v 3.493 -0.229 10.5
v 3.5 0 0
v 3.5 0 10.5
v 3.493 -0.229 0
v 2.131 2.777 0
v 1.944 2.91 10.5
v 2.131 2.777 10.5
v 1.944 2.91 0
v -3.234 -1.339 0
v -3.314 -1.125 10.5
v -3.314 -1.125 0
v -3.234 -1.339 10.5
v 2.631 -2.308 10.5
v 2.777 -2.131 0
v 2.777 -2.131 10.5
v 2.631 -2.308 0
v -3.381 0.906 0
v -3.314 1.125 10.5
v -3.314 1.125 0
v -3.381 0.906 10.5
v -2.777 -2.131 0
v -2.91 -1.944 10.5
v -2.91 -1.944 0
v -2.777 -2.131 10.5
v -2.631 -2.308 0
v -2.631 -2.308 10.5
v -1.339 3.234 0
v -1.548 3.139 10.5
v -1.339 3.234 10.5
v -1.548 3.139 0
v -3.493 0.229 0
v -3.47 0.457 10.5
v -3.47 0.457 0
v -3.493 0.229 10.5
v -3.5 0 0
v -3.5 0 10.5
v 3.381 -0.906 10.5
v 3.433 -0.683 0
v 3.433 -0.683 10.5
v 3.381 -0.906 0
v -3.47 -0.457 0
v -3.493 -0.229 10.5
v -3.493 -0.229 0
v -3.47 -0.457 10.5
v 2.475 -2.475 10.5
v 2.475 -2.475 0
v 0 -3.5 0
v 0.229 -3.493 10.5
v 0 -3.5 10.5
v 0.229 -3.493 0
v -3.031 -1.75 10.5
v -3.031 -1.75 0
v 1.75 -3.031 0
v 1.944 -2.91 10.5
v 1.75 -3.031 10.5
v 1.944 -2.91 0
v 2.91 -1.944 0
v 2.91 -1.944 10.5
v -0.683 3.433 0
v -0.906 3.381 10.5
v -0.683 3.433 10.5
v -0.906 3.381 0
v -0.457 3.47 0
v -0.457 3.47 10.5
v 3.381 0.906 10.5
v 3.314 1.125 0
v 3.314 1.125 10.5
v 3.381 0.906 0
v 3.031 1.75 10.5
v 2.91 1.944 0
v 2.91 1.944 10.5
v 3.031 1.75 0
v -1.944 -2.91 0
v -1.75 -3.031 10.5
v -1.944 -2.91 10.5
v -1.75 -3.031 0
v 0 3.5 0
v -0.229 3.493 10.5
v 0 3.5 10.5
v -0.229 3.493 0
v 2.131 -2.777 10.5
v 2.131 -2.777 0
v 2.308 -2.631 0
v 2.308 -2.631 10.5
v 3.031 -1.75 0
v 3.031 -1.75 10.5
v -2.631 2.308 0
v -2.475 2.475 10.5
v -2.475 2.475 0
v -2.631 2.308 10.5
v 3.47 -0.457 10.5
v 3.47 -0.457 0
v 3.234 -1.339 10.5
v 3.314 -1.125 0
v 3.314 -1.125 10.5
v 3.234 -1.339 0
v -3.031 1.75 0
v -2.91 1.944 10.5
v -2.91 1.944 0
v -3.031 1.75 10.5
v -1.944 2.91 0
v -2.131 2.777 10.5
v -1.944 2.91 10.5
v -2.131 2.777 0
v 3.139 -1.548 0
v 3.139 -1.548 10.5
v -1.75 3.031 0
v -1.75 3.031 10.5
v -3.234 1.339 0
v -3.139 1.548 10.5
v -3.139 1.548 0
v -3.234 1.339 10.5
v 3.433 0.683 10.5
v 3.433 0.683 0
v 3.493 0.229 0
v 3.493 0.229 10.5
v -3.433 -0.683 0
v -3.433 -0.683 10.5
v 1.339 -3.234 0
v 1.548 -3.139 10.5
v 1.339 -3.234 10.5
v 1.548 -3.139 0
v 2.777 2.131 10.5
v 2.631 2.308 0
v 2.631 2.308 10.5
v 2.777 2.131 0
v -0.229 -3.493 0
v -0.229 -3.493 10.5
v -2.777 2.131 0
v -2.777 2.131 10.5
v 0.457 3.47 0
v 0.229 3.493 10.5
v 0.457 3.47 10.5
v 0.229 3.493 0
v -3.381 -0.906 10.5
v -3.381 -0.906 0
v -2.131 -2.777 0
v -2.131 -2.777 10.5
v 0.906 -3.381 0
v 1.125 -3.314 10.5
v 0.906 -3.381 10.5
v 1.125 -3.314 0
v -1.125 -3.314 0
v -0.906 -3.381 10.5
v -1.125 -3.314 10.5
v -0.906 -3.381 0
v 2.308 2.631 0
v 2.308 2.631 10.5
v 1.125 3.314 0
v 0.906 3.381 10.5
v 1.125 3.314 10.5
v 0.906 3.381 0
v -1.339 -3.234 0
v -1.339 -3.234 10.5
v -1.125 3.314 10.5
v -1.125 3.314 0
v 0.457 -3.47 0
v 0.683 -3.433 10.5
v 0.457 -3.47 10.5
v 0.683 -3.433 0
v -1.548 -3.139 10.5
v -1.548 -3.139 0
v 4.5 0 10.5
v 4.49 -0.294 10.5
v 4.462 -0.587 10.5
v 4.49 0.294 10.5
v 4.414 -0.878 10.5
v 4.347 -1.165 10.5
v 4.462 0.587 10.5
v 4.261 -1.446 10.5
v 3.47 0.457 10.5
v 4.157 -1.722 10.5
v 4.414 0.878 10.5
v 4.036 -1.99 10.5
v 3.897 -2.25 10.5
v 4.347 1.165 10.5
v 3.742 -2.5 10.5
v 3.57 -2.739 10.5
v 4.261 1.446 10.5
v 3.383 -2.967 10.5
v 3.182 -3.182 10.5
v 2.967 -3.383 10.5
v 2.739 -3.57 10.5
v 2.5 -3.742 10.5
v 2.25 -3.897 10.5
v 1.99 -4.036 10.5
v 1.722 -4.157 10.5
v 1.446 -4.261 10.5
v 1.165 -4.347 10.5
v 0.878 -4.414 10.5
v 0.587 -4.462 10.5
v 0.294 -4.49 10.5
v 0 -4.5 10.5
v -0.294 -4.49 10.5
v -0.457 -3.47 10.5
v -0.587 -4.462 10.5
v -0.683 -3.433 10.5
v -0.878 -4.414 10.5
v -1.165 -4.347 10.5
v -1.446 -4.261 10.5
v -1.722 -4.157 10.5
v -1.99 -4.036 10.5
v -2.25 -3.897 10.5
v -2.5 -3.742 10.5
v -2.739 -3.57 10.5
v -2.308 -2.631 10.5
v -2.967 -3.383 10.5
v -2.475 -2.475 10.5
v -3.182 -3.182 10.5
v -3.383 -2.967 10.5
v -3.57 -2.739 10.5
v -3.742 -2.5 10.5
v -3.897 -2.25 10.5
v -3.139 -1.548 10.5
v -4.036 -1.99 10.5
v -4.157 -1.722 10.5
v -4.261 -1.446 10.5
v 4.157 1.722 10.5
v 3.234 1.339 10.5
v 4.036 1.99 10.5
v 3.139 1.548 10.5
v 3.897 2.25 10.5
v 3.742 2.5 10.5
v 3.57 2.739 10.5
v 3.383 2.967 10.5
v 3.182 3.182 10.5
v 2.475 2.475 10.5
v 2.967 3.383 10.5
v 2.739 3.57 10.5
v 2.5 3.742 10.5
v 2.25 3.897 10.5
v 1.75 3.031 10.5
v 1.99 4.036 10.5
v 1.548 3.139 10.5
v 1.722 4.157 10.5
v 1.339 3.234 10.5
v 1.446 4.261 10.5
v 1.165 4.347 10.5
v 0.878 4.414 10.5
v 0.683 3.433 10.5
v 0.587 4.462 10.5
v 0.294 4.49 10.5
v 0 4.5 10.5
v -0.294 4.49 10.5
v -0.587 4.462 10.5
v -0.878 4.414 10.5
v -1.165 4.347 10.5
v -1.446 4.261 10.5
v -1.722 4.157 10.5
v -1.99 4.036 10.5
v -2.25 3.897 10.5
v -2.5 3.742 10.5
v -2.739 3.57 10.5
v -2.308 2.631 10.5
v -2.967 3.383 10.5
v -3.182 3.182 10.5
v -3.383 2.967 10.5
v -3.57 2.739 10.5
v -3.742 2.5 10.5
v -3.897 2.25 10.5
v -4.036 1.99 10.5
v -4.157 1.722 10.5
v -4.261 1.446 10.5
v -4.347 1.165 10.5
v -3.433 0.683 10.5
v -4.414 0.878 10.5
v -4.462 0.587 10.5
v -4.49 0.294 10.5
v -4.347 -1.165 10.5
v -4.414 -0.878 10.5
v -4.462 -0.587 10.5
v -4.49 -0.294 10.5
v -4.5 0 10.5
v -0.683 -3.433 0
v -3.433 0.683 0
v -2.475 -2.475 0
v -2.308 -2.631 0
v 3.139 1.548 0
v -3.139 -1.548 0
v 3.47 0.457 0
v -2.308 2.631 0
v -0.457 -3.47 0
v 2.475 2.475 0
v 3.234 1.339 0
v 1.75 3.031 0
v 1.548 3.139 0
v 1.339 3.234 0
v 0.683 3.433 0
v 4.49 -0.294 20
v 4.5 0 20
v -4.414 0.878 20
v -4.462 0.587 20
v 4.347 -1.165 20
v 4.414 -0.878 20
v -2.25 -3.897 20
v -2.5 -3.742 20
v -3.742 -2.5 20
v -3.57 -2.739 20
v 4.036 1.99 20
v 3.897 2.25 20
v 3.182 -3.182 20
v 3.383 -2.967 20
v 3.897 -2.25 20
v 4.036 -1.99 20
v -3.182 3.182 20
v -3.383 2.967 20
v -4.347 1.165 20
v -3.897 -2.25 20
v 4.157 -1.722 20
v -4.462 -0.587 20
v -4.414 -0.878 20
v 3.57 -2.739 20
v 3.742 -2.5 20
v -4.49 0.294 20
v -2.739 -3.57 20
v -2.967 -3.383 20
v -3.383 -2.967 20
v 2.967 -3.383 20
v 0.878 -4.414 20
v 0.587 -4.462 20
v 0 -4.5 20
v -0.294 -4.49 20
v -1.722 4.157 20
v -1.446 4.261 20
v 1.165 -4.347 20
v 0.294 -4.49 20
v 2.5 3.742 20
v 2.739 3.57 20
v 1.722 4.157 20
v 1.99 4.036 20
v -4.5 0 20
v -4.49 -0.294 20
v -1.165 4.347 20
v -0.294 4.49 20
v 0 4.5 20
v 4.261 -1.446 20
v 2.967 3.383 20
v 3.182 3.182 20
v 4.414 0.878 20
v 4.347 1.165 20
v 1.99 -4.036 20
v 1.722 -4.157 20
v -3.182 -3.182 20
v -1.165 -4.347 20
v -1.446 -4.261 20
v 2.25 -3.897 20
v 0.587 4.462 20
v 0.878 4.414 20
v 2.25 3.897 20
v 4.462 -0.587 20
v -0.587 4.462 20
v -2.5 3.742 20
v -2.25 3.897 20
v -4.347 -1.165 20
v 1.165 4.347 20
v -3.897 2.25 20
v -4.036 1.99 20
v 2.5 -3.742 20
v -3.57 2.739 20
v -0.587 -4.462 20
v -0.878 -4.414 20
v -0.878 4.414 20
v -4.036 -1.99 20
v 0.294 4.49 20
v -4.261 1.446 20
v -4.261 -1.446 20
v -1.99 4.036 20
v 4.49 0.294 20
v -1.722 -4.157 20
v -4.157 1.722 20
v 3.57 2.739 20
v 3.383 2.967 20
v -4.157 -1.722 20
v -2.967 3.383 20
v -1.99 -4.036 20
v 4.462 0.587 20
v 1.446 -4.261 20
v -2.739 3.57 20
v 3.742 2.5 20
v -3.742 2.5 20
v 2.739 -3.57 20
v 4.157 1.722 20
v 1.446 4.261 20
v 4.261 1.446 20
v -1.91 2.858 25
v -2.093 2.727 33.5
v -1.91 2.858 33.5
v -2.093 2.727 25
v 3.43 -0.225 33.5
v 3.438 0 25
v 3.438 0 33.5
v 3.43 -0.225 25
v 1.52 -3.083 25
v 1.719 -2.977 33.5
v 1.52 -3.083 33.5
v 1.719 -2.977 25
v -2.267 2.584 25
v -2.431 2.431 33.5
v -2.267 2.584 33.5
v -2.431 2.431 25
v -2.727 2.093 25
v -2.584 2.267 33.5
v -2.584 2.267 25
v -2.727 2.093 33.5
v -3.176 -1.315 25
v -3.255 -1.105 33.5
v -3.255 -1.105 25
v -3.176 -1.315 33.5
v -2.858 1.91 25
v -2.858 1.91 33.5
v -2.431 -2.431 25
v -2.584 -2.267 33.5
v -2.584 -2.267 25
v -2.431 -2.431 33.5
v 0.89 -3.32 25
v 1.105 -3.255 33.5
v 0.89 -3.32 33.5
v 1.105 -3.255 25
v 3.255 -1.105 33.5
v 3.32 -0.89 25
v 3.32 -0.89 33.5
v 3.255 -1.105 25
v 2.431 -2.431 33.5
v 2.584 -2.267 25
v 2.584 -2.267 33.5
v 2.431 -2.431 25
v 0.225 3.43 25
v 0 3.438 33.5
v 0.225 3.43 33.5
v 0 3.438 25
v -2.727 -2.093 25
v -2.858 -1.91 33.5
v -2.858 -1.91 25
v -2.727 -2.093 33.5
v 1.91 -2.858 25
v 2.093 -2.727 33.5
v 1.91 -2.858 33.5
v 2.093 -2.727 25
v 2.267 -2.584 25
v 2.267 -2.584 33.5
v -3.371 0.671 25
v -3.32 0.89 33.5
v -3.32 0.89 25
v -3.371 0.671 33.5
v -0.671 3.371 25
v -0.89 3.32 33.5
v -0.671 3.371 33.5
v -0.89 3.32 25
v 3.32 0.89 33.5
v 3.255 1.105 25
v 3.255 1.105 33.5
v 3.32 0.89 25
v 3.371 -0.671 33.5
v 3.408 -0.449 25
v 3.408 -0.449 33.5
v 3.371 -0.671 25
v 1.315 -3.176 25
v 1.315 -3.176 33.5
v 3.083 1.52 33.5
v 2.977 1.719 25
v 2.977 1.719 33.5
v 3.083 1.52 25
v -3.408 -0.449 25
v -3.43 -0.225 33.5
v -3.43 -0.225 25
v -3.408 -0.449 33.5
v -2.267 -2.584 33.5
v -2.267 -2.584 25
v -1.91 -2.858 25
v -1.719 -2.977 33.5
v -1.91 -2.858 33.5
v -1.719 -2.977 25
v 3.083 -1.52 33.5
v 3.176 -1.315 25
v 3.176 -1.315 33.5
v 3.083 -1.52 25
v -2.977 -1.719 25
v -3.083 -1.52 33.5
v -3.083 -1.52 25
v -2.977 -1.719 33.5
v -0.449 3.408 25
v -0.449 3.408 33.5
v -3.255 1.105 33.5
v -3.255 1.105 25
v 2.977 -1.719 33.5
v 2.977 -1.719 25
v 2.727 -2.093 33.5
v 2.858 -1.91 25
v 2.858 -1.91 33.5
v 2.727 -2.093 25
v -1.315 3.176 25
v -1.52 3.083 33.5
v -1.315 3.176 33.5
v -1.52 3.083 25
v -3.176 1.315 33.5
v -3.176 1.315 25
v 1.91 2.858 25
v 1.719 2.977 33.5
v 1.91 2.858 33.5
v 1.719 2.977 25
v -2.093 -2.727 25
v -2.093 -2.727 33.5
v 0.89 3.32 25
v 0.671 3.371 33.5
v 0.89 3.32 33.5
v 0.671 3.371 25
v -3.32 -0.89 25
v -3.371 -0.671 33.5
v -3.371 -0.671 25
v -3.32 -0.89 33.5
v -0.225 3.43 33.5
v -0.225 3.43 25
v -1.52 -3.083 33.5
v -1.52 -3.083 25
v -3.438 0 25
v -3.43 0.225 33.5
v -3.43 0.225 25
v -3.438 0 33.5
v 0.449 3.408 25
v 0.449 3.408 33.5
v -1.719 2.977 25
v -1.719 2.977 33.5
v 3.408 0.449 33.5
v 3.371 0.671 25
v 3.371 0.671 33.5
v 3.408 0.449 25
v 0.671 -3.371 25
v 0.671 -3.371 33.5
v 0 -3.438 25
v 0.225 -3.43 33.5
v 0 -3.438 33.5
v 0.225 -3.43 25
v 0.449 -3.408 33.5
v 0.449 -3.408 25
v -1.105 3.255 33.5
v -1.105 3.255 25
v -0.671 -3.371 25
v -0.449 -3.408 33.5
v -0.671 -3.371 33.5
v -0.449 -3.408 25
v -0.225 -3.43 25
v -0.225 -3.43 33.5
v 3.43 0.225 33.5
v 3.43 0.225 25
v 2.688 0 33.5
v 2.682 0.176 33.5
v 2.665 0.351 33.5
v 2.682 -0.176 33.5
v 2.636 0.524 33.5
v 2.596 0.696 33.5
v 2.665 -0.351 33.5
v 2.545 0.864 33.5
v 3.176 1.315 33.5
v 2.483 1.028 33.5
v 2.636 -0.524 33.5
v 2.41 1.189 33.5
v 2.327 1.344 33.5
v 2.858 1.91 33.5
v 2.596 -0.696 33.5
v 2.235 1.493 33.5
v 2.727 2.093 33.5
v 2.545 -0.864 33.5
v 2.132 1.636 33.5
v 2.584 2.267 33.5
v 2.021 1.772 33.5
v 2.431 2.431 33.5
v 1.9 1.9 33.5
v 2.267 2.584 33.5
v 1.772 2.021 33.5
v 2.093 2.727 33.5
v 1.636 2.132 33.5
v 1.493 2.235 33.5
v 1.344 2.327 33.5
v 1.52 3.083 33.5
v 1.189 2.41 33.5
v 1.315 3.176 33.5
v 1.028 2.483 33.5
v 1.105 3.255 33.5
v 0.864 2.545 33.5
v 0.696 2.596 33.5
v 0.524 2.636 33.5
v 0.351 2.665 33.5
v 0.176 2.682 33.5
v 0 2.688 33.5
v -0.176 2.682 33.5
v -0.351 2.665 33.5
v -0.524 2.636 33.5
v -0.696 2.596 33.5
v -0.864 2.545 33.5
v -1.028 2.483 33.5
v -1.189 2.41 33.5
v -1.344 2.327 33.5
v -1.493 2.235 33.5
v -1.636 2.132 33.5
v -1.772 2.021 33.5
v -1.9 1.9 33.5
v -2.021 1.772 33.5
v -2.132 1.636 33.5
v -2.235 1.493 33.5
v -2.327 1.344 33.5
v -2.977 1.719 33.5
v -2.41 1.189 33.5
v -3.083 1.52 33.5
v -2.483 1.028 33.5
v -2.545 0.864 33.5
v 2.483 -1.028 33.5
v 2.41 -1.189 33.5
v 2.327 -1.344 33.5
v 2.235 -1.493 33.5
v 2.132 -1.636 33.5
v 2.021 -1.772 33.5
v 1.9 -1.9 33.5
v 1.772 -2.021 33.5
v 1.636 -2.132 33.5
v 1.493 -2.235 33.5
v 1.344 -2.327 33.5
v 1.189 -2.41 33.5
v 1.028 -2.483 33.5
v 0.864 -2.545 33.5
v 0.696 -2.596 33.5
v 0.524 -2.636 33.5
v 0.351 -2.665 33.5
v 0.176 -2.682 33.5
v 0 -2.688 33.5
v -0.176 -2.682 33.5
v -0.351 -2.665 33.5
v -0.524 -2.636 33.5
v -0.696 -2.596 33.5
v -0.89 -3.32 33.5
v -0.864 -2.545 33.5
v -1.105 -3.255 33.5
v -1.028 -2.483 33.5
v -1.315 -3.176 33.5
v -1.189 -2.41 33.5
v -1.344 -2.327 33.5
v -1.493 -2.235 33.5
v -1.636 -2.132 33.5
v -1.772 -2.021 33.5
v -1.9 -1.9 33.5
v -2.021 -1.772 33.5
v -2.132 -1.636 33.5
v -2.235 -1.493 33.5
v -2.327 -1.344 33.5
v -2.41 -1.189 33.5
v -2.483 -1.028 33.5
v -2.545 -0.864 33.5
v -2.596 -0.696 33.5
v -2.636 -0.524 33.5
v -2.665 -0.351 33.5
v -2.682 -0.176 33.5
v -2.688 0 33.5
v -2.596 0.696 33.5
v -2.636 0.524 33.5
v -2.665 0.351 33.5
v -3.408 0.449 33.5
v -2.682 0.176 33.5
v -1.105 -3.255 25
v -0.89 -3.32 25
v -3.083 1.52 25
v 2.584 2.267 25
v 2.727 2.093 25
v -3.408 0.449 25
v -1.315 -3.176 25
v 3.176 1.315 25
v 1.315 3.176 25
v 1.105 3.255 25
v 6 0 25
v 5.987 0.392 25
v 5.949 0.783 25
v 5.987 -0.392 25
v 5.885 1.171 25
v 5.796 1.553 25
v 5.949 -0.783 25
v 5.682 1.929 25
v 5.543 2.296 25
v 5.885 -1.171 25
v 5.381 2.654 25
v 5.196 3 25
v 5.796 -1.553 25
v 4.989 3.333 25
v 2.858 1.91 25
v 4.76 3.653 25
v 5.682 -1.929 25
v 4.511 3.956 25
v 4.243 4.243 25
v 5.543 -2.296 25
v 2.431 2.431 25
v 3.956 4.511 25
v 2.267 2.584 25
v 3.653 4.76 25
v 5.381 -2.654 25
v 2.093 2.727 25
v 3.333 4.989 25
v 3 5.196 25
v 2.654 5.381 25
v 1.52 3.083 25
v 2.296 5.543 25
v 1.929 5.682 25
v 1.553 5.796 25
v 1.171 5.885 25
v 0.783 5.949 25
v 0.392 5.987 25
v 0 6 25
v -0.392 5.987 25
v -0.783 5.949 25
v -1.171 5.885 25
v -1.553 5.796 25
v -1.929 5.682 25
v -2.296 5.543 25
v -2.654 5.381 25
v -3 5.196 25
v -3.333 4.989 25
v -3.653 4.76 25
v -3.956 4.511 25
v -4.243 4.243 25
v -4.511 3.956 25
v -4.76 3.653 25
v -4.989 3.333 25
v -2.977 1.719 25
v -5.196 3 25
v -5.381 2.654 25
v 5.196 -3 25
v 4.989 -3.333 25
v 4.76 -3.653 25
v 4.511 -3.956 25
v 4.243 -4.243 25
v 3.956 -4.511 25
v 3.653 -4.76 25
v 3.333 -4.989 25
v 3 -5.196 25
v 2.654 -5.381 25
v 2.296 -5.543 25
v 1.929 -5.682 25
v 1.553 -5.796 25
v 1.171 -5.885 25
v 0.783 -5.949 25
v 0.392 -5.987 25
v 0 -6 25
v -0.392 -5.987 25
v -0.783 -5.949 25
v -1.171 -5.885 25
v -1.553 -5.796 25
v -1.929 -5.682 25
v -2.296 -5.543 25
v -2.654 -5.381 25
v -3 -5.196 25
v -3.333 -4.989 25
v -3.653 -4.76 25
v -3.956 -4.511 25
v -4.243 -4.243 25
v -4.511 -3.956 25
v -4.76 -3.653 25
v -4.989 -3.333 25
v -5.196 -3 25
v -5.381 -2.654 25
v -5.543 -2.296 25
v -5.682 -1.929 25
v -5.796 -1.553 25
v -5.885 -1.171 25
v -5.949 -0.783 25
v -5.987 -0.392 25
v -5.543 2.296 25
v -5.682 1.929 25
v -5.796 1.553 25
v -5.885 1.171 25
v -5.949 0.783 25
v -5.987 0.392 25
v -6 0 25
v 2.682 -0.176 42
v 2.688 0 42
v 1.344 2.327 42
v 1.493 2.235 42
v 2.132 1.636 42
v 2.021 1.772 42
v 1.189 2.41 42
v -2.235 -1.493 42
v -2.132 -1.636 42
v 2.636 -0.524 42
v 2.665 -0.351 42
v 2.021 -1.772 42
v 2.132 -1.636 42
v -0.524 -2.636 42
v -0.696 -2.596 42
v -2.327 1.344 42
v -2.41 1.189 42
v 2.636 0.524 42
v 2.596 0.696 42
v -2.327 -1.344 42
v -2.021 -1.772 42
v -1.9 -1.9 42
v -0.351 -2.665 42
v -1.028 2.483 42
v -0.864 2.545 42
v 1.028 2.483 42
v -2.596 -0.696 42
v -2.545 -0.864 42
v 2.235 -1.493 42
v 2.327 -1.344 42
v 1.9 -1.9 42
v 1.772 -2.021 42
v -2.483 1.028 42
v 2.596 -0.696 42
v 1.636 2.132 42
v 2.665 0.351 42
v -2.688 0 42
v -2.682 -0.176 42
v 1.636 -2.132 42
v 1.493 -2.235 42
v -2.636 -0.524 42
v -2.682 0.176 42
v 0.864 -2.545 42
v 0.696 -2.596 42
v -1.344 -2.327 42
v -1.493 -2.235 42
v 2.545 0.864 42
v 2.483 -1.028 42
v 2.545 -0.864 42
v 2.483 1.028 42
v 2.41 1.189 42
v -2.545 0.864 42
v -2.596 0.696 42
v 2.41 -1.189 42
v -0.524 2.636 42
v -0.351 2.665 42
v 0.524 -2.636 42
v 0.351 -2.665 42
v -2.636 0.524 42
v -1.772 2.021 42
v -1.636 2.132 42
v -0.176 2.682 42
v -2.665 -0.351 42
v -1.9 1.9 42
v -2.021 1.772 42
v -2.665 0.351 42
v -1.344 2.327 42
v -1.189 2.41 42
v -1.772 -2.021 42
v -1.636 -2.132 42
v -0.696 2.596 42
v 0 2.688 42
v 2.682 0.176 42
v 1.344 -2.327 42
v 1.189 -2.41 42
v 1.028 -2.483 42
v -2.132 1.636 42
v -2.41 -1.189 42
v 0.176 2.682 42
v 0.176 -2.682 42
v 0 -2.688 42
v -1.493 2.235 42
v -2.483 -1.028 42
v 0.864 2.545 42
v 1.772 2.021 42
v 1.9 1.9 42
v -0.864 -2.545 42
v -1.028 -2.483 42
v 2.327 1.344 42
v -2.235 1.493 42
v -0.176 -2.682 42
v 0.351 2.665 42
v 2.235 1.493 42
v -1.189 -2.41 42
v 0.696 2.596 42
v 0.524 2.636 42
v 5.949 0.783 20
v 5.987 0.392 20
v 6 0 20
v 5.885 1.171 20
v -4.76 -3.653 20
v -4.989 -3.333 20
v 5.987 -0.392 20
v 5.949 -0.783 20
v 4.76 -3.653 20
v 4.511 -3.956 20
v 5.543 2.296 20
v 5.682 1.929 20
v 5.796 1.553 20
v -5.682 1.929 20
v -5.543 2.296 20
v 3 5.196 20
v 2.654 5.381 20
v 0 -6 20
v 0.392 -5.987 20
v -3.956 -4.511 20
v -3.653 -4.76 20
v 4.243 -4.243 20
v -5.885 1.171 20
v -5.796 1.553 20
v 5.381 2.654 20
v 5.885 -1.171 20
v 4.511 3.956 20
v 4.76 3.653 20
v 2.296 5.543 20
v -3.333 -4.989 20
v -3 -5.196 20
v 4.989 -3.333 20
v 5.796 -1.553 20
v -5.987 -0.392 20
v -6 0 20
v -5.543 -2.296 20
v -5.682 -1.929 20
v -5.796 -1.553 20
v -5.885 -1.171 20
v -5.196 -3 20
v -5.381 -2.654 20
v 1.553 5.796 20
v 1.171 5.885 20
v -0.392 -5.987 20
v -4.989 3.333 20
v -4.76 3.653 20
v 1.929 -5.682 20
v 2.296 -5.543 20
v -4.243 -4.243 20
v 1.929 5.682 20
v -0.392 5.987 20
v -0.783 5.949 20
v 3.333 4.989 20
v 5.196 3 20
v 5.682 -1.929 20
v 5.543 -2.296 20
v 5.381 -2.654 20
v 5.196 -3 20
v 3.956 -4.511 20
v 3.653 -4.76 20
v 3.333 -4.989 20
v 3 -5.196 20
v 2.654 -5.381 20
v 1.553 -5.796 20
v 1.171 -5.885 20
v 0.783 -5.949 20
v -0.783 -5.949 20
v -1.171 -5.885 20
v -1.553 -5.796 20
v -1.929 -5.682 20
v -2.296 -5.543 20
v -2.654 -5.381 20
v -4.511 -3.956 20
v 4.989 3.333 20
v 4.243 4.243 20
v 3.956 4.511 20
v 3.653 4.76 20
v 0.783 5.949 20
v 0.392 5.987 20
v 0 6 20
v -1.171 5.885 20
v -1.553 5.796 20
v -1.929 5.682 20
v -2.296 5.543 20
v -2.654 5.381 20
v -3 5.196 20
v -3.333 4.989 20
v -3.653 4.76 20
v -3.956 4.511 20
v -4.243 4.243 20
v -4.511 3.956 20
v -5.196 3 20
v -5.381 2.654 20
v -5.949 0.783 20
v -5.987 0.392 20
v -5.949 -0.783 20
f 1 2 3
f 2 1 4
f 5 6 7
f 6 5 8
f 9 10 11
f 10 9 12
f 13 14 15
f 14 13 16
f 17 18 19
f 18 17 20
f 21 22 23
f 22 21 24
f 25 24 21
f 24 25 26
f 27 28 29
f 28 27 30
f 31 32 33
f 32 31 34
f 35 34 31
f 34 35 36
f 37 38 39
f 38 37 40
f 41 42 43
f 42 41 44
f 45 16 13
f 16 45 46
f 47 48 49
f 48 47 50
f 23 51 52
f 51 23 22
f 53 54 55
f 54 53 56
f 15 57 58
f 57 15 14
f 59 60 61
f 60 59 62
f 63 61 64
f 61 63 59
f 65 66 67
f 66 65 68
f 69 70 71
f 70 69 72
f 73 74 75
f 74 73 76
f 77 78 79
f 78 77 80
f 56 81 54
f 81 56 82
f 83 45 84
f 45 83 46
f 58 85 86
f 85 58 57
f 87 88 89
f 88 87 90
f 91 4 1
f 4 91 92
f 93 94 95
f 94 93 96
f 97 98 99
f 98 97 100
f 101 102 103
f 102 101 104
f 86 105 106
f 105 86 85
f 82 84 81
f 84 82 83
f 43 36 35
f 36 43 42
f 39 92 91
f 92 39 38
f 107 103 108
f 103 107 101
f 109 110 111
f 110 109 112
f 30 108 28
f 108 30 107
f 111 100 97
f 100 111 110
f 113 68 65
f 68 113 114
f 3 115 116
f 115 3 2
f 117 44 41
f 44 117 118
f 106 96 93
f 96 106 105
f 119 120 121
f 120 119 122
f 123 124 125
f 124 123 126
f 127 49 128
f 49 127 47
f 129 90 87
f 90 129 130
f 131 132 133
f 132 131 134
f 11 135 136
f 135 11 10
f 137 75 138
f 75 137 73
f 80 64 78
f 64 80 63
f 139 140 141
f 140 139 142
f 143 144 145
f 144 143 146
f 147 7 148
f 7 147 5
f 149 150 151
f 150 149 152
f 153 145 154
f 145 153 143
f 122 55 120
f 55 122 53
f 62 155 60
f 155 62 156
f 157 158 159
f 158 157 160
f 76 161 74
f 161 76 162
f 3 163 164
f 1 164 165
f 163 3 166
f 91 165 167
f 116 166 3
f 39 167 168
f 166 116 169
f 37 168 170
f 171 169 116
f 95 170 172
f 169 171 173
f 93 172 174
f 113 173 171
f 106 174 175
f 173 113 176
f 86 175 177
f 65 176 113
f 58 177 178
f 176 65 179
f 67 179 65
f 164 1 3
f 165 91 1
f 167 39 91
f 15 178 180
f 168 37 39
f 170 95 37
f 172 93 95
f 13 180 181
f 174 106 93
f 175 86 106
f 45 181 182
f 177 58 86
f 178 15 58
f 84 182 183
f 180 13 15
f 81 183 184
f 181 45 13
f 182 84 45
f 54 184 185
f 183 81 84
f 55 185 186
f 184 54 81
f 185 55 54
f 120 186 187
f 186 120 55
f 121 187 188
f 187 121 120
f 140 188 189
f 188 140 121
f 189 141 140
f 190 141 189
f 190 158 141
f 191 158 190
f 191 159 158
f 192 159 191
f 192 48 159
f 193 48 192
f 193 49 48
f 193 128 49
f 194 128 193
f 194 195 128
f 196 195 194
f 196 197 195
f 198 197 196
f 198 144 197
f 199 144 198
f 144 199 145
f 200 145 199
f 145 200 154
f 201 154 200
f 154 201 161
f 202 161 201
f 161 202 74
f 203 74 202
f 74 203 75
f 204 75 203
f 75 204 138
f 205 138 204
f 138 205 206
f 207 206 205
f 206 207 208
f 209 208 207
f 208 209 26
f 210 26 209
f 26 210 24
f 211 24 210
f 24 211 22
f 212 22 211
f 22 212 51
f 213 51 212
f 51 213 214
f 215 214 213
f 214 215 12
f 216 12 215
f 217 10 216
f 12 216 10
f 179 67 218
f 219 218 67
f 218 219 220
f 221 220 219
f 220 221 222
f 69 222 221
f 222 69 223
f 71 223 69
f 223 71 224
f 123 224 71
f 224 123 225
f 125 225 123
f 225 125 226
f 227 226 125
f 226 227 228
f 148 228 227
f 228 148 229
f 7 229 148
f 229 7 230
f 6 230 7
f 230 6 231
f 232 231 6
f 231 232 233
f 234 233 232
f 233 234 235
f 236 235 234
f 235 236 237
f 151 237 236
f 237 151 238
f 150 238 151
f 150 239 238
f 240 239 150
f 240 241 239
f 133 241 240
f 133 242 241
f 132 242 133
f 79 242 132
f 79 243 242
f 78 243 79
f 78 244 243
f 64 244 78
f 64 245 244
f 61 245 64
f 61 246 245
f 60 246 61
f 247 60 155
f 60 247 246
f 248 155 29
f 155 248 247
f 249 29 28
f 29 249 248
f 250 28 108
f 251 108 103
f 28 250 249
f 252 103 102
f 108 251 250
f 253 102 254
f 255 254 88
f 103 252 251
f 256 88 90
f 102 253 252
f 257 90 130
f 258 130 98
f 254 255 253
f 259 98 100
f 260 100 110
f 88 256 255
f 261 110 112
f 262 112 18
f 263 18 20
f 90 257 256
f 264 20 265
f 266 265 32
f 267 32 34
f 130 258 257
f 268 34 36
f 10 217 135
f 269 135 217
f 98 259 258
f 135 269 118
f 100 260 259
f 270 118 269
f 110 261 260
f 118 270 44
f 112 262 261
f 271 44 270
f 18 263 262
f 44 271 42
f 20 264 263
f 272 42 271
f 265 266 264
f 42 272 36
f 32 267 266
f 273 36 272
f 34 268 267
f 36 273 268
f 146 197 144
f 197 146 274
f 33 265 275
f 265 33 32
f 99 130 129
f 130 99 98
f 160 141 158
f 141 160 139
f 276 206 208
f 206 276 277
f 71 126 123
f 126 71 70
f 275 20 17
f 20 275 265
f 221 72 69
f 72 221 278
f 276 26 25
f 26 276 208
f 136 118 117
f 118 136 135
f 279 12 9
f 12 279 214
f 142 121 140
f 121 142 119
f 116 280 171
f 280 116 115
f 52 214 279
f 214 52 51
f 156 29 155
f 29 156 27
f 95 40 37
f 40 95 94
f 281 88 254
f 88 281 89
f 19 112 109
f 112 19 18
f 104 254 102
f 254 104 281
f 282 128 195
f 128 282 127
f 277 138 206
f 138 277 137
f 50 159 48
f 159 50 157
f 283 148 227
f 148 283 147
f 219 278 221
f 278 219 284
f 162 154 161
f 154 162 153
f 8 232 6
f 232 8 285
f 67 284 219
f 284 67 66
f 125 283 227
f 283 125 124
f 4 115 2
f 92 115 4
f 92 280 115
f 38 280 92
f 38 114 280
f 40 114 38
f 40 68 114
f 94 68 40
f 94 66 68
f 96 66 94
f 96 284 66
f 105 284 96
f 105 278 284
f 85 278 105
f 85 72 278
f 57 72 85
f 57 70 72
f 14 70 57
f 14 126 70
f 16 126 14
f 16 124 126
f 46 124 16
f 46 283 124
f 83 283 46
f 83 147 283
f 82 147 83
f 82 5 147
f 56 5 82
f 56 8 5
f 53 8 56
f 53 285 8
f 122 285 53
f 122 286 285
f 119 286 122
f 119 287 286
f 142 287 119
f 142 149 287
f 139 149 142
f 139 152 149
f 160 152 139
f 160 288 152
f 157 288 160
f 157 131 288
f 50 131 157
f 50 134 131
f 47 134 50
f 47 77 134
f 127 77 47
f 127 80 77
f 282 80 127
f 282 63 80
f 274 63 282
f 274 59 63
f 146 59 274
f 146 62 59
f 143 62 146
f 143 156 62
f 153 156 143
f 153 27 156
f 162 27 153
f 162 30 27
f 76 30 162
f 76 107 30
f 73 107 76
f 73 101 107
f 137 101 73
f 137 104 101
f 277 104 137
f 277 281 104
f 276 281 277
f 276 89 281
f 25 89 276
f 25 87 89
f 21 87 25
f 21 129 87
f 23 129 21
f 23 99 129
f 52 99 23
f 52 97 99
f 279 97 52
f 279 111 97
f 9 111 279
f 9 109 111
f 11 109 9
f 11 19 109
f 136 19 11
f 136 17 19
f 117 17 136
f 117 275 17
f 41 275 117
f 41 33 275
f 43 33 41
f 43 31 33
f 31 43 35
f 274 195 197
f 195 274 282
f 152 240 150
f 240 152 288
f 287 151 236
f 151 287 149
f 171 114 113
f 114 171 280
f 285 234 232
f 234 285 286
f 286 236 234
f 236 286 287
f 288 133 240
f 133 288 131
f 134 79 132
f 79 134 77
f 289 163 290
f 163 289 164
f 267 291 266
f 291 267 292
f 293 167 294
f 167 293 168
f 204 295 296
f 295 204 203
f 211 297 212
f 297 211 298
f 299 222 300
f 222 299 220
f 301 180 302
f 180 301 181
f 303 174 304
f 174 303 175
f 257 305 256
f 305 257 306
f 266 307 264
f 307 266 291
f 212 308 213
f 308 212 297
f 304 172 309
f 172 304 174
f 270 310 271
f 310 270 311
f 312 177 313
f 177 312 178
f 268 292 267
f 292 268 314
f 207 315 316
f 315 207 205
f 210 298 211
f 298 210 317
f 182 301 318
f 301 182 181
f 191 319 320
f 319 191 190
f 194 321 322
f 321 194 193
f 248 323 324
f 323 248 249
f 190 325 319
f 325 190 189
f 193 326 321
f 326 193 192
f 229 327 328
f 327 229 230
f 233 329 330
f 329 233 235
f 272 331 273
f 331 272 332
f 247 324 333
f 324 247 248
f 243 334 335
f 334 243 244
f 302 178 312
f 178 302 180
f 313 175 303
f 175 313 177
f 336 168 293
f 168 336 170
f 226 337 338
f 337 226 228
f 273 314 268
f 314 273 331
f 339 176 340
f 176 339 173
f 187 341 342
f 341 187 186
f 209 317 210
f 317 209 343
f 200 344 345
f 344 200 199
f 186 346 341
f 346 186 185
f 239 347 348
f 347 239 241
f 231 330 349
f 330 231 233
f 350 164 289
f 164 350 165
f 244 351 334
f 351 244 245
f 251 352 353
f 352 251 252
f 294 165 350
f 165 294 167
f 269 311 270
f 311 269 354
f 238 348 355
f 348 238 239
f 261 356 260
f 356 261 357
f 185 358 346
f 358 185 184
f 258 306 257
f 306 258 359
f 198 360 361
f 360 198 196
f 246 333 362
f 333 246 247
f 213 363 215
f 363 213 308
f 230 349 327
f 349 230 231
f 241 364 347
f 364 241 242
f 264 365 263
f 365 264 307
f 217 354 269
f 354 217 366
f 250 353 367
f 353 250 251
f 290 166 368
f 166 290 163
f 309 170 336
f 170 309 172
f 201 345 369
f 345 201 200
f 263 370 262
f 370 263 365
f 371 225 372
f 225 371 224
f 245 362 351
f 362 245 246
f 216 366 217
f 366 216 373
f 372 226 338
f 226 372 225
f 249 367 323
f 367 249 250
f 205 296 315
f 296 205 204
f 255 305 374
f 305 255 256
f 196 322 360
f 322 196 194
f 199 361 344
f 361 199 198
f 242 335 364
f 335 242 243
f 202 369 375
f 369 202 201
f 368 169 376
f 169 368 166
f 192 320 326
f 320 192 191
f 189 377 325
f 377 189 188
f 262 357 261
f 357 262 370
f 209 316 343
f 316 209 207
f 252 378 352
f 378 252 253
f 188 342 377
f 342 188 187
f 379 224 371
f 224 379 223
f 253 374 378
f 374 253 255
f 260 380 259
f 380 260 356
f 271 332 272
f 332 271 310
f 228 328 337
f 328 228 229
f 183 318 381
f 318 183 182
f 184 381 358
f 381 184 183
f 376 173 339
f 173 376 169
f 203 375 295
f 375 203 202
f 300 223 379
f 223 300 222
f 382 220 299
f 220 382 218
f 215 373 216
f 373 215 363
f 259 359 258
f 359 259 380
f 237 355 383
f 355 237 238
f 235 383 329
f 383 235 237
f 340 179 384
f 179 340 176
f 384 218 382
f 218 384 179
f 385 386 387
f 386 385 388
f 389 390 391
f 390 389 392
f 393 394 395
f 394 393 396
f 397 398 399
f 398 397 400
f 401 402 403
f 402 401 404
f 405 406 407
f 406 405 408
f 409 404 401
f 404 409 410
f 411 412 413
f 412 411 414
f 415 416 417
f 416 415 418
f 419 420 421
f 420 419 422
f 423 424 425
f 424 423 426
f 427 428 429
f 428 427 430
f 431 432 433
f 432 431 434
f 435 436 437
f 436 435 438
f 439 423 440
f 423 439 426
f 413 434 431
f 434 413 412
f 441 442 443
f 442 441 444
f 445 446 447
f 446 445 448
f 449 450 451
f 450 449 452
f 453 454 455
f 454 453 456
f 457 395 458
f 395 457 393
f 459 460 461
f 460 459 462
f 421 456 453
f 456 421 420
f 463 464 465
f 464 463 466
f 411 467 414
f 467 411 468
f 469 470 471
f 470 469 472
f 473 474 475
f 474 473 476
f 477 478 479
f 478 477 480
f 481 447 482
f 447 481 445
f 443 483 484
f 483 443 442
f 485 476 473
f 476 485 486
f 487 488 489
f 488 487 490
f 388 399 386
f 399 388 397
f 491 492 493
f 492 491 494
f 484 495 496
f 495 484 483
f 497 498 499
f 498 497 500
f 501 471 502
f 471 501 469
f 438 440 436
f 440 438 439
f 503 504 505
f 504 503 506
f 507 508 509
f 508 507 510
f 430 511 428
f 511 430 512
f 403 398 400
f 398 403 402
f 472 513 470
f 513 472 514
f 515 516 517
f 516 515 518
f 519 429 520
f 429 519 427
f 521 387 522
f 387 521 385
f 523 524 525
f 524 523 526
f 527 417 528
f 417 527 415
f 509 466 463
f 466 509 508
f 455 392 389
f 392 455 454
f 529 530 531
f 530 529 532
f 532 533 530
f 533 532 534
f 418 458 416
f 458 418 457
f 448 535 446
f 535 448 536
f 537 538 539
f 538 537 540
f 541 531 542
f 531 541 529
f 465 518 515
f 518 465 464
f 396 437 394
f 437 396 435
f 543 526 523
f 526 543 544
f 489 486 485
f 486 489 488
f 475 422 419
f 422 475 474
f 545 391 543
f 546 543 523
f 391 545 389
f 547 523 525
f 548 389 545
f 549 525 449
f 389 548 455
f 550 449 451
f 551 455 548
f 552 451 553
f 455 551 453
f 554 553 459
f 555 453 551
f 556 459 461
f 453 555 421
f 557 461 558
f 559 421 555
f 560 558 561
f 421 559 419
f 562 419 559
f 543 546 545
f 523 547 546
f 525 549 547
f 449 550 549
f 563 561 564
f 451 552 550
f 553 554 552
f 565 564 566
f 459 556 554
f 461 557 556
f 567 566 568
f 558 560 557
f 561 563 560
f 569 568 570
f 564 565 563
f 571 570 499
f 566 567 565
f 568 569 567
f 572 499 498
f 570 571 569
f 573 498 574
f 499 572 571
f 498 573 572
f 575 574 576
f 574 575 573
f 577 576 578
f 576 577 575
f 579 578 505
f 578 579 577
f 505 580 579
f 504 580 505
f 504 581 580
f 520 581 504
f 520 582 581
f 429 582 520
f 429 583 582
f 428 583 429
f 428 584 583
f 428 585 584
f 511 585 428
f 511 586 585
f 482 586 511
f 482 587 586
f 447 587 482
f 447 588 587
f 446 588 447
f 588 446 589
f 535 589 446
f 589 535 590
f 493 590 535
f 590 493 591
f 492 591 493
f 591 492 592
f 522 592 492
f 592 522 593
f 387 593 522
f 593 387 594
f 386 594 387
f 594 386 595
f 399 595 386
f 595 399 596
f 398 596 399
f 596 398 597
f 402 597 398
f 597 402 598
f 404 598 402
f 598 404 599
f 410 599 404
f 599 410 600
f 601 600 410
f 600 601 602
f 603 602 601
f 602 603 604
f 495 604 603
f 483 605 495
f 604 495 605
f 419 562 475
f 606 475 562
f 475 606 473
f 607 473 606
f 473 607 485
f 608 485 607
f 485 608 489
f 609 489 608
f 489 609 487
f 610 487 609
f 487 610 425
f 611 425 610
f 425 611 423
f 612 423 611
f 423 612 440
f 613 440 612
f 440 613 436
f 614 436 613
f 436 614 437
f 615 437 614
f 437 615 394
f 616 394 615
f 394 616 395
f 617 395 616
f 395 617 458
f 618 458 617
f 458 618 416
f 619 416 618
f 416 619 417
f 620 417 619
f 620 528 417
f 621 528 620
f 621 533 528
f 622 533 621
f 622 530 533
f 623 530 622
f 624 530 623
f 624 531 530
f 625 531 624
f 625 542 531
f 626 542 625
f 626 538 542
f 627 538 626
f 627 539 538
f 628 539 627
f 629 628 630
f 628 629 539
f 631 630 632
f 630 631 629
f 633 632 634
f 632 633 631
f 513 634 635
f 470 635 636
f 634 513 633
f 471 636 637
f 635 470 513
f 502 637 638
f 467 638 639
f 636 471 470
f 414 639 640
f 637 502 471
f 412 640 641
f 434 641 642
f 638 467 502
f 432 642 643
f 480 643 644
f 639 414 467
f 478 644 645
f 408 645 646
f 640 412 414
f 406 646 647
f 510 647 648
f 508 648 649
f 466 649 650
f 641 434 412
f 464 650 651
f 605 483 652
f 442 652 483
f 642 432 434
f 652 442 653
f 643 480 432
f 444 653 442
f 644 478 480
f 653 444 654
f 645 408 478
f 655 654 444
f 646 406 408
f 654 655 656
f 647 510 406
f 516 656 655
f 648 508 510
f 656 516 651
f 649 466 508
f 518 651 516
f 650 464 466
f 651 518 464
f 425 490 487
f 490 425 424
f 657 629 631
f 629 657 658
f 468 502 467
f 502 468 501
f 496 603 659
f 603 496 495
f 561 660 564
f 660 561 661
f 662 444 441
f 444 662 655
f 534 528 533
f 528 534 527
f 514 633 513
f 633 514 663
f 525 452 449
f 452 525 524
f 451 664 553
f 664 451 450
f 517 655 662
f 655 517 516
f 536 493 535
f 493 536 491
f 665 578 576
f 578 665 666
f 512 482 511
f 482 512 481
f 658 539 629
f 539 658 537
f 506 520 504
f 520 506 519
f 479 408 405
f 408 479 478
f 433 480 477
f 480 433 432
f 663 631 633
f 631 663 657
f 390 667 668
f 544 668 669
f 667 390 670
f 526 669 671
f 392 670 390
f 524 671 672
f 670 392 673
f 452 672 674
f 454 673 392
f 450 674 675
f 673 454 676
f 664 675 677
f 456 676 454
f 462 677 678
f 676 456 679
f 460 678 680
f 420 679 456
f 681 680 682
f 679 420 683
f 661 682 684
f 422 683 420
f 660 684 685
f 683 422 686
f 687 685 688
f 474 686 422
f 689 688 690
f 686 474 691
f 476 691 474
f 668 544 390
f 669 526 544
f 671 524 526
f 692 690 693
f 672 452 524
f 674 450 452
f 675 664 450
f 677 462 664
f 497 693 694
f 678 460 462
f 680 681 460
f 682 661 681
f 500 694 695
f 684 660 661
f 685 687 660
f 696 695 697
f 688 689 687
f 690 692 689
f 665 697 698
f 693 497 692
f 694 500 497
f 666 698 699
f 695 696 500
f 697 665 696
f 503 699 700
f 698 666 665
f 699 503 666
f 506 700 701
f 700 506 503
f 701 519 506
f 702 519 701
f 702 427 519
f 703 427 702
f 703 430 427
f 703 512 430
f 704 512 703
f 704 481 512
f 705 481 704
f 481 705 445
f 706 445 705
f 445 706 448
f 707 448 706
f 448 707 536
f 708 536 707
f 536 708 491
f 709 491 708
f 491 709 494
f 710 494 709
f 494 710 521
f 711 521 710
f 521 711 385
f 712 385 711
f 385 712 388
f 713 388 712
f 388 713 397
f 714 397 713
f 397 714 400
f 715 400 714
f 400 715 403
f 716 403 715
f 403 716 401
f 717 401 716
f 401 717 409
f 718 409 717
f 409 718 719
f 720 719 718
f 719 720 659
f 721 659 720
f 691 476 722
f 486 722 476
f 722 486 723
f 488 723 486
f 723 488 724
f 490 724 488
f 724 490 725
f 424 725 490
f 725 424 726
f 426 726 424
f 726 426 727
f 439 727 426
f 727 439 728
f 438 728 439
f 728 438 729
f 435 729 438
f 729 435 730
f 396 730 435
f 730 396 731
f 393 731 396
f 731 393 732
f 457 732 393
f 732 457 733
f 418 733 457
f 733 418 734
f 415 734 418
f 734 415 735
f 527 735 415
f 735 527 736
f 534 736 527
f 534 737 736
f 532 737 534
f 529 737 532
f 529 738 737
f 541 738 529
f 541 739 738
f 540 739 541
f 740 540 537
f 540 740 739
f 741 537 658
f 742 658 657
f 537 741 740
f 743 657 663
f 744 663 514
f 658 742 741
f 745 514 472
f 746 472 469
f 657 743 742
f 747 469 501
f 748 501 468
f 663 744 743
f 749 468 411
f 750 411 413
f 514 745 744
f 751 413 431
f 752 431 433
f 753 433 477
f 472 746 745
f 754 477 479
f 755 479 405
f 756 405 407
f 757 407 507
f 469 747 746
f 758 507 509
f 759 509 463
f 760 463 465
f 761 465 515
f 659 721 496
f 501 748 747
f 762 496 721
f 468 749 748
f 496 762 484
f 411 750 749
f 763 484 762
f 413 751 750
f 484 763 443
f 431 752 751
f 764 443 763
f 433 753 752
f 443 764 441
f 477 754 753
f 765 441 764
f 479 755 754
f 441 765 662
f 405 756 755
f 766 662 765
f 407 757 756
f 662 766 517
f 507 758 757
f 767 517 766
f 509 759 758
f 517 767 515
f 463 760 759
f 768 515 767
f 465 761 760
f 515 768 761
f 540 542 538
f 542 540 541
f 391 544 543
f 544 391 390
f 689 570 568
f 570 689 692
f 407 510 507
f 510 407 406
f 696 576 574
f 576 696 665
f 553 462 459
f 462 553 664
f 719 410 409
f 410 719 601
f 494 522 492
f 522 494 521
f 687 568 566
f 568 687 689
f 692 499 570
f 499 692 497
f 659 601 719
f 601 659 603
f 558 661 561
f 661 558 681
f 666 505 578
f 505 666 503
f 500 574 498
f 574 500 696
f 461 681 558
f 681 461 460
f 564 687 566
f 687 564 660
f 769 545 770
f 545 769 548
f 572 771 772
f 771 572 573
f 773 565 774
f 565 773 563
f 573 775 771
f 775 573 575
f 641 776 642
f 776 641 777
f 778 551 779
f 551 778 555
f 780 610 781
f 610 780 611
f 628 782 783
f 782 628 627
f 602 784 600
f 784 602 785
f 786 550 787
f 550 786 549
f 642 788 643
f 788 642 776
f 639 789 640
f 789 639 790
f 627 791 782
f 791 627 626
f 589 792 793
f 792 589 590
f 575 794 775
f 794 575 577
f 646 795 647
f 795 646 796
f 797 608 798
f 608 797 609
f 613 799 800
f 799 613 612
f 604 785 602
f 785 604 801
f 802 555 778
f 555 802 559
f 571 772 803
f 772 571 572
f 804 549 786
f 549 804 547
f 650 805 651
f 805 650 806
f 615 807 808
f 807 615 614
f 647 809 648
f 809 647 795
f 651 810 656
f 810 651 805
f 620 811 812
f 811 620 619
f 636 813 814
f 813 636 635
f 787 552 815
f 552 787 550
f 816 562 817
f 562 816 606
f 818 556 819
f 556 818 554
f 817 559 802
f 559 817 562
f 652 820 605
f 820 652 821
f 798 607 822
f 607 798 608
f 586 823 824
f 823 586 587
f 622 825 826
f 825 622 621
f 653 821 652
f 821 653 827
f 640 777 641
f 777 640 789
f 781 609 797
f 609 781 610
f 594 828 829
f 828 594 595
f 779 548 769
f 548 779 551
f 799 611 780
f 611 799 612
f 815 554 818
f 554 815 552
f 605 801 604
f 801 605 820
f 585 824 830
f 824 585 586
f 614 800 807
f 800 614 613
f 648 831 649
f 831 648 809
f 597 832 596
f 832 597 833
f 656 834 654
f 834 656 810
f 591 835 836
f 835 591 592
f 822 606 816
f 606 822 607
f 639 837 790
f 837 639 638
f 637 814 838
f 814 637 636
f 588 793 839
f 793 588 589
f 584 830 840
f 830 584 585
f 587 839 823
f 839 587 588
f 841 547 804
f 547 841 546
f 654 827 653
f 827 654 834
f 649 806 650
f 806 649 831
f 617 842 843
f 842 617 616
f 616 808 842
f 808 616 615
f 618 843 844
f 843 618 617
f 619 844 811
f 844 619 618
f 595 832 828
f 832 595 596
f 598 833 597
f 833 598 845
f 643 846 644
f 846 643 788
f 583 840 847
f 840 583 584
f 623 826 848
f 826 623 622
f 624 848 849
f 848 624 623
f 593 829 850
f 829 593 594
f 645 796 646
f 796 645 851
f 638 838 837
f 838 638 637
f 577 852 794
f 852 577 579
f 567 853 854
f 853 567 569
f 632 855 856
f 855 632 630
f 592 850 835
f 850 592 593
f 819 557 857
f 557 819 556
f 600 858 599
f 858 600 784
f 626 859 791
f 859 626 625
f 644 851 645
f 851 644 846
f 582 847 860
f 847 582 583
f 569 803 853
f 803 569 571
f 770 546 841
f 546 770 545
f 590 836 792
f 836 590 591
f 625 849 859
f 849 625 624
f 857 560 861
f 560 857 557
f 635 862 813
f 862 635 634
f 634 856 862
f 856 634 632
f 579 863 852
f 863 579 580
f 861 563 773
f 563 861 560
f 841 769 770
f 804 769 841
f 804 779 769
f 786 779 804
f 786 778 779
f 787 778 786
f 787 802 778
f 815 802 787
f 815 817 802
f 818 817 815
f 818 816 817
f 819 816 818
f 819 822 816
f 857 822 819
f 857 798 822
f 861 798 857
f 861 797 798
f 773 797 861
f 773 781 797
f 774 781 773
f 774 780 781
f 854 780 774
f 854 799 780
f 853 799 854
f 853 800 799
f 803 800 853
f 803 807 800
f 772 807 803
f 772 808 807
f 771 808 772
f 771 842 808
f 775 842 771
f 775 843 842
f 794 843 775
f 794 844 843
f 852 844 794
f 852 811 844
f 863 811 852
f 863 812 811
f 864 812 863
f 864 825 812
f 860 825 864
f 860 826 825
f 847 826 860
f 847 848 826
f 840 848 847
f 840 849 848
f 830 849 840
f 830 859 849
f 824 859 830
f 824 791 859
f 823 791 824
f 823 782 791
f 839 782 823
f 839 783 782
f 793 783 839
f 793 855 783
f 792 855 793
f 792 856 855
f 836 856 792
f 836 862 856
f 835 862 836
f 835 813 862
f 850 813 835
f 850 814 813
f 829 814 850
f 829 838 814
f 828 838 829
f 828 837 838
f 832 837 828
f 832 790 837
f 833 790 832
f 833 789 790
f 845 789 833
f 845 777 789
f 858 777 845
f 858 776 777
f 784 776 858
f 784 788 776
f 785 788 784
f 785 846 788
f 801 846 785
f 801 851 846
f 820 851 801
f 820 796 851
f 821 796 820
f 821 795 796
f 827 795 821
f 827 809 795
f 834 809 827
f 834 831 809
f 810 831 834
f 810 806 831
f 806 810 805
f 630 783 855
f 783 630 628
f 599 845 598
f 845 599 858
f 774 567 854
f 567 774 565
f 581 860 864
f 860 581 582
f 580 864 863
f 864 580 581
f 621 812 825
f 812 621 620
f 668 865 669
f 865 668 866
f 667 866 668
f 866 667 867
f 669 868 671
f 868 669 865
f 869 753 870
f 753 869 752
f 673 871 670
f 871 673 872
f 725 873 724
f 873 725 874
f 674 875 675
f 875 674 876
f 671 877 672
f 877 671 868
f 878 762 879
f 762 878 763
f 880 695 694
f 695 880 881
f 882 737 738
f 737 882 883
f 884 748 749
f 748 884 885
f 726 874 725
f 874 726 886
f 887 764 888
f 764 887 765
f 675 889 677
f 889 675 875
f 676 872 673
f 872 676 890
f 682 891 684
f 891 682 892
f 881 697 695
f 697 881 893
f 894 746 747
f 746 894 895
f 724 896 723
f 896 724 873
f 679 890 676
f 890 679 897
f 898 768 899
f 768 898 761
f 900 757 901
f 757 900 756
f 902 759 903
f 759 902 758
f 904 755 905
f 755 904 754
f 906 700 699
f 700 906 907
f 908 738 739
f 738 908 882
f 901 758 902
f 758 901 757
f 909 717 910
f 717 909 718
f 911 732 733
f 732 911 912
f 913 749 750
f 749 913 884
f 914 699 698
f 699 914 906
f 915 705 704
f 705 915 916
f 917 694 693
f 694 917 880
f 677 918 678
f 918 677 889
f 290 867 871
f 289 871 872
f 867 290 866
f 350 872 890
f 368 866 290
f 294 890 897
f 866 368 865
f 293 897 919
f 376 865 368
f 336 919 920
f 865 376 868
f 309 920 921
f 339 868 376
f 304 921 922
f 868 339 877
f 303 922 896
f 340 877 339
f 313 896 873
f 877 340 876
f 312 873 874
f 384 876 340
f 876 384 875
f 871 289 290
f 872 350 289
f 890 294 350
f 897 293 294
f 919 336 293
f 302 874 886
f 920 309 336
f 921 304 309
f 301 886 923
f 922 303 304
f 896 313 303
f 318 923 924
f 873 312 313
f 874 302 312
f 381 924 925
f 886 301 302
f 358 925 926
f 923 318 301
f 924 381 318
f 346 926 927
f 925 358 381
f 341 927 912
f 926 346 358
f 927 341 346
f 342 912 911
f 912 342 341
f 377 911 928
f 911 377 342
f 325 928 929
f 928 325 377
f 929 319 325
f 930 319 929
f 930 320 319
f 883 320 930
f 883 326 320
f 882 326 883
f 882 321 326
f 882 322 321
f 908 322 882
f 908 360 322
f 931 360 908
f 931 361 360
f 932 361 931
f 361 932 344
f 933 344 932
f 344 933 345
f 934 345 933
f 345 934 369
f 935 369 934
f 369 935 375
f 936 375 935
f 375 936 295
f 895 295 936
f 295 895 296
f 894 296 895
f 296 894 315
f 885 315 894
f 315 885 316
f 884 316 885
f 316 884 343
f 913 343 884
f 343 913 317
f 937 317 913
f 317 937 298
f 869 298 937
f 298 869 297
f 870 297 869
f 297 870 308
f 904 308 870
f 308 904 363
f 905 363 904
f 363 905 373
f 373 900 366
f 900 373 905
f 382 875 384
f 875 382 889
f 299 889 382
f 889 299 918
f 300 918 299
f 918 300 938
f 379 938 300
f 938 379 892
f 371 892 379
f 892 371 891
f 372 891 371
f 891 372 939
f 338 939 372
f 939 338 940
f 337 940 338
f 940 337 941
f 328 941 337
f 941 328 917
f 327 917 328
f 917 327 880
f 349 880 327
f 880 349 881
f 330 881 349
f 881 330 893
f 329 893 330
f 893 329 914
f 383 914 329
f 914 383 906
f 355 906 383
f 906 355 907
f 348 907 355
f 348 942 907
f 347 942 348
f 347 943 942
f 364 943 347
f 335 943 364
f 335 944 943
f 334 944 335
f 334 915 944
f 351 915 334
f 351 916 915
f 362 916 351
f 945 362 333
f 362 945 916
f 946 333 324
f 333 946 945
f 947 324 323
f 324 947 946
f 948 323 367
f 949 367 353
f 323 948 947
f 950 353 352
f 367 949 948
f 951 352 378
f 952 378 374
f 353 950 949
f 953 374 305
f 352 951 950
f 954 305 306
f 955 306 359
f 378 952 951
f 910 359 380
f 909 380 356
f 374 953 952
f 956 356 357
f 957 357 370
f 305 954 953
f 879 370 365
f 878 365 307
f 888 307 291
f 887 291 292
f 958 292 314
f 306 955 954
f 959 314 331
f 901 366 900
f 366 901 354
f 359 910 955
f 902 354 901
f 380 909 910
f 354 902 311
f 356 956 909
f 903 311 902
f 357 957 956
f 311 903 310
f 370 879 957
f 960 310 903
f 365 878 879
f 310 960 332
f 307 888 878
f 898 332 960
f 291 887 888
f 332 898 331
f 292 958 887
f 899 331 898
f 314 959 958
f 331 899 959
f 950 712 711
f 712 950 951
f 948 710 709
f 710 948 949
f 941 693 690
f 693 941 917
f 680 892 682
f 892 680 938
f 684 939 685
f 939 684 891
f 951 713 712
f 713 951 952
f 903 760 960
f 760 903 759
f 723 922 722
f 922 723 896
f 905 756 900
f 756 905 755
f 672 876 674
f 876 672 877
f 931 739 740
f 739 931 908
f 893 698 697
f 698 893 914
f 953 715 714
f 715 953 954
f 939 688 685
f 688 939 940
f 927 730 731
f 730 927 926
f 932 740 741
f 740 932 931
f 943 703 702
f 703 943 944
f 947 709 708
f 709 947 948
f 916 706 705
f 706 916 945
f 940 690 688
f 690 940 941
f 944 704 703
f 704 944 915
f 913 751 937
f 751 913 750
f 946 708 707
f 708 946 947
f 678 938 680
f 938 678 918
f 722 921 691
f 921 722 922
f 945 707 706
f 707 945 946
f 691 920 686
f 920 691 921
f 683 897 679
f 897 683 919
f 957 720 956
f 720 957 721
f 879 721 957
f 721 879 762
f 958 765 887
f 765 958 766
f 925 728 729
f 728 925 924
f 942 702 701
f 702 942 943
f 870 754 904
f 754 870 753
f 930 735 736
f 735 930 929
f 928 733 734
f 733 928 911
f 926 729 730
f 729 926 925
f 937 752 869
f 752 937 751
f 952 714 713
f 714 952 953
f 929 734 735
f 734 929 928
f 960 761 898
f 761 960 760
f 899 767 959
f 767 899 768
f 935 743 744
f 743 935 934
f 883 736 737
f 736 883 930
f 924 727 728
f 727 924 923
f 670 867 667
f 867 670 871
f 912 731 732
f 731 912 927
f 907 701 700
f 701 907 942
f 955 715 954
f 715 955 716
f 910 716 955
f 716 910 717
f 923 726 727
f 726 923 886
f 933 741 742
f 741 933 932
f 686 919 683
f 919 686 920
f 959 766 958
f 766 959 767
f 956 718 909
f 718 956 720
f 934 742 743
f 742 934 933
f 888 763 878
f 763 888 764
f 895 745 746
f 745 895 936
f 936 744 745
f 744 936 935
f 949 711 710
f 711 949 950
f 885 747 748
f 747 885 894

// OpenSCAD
// Straight hose-barb reducer: 8 mm tubing to 5 mm tubing
// Print orientation: standing upright along +Z, centred on the origin in X/Y.
// The two barbs at each end are stacked (one above the other) and may overlap slightly.

$fn = 96;

// ---------------- Dimensions (mm) ----------------
reducer_id      = 8;    // inner diameter of the 8 mm tubing
reducer_od      = 5;    // inner diameter of the 5 mm tubing
barb_count      = 2;    // number of barbs at each end (stacked)
barb_height_8   = 10;   // height of each 8 mm barb, from z = 0 to z = 20
barb_od_start_8 = 7.5;  // outer diameter of the 8 mm barbs at their bottom
barb_od_end_8   = 9.5;  // outer diameter of the 8 mm barbs at their top
barb_height_5   = 8;    // height of each 5 mm barb, from z = 25 to z = 41
barb_od_start_5 = 6.5;  // outer diameter of the 5 mm barbs at their bottom
barb_od_end_5   = 5.0;  // outer diameter of the 5 mm barbs at their top
collar_od       = 12;   // outer diameter of the cylindrical collar (z = 20 to 25)
eps             = 0.5;   // overshoot so cutters pass through faces

// Derived
reducer_length  = 41;   // overall length along Z
overlap         = 0.5;  // how far the stacked barbs overlap each other

// ---------------- Model ----------------
union() {
    // 8 mm tubing end: two barbs, stacked, from z = 0 to z = 20
    for (i = [0 : barb_count - 1]) {
        translate([0, 0, i * (barb_height_8 + overlap)])
            linear_extrude(height = barb_height_8 + overlap)
                circle(d = barb_od_start_8 + (barb_od_end_8 - barb_od_start_8) *
                       (i - 0.5 + 0.5 / barb_count), r = eps);
    }

    // Cylindrical collar from z = 20 to z = 25
    translate([0, 0, 20])
        cylinder(h = 5, d = collar_od);

    // 5 mm tubing end: two barbs, stacked, from z = 25 to z = 41
    for (i = [0 : barb_count - 1]) {
        translate([0, 0, 25 + i * (barb_height_5 + overlap)])
            linear_extrude(height = barb_height_5 + overlap)
                circle(d = barb_od_start_5 + (barb_od_end_5 - barb_od_start_5) *
                       (i - 0.5 + 0.5 / barb_count), r = eps);
    }
}

// ---------------- Bore ----------------
// A 3 mm bore runs straight through the full length of the part
translate([0, 0, -eps])
    rotate_extrude()
        translate([0, -1.5, 0])
            cube([reducer_length + 2 * eps, 3, 1]);
